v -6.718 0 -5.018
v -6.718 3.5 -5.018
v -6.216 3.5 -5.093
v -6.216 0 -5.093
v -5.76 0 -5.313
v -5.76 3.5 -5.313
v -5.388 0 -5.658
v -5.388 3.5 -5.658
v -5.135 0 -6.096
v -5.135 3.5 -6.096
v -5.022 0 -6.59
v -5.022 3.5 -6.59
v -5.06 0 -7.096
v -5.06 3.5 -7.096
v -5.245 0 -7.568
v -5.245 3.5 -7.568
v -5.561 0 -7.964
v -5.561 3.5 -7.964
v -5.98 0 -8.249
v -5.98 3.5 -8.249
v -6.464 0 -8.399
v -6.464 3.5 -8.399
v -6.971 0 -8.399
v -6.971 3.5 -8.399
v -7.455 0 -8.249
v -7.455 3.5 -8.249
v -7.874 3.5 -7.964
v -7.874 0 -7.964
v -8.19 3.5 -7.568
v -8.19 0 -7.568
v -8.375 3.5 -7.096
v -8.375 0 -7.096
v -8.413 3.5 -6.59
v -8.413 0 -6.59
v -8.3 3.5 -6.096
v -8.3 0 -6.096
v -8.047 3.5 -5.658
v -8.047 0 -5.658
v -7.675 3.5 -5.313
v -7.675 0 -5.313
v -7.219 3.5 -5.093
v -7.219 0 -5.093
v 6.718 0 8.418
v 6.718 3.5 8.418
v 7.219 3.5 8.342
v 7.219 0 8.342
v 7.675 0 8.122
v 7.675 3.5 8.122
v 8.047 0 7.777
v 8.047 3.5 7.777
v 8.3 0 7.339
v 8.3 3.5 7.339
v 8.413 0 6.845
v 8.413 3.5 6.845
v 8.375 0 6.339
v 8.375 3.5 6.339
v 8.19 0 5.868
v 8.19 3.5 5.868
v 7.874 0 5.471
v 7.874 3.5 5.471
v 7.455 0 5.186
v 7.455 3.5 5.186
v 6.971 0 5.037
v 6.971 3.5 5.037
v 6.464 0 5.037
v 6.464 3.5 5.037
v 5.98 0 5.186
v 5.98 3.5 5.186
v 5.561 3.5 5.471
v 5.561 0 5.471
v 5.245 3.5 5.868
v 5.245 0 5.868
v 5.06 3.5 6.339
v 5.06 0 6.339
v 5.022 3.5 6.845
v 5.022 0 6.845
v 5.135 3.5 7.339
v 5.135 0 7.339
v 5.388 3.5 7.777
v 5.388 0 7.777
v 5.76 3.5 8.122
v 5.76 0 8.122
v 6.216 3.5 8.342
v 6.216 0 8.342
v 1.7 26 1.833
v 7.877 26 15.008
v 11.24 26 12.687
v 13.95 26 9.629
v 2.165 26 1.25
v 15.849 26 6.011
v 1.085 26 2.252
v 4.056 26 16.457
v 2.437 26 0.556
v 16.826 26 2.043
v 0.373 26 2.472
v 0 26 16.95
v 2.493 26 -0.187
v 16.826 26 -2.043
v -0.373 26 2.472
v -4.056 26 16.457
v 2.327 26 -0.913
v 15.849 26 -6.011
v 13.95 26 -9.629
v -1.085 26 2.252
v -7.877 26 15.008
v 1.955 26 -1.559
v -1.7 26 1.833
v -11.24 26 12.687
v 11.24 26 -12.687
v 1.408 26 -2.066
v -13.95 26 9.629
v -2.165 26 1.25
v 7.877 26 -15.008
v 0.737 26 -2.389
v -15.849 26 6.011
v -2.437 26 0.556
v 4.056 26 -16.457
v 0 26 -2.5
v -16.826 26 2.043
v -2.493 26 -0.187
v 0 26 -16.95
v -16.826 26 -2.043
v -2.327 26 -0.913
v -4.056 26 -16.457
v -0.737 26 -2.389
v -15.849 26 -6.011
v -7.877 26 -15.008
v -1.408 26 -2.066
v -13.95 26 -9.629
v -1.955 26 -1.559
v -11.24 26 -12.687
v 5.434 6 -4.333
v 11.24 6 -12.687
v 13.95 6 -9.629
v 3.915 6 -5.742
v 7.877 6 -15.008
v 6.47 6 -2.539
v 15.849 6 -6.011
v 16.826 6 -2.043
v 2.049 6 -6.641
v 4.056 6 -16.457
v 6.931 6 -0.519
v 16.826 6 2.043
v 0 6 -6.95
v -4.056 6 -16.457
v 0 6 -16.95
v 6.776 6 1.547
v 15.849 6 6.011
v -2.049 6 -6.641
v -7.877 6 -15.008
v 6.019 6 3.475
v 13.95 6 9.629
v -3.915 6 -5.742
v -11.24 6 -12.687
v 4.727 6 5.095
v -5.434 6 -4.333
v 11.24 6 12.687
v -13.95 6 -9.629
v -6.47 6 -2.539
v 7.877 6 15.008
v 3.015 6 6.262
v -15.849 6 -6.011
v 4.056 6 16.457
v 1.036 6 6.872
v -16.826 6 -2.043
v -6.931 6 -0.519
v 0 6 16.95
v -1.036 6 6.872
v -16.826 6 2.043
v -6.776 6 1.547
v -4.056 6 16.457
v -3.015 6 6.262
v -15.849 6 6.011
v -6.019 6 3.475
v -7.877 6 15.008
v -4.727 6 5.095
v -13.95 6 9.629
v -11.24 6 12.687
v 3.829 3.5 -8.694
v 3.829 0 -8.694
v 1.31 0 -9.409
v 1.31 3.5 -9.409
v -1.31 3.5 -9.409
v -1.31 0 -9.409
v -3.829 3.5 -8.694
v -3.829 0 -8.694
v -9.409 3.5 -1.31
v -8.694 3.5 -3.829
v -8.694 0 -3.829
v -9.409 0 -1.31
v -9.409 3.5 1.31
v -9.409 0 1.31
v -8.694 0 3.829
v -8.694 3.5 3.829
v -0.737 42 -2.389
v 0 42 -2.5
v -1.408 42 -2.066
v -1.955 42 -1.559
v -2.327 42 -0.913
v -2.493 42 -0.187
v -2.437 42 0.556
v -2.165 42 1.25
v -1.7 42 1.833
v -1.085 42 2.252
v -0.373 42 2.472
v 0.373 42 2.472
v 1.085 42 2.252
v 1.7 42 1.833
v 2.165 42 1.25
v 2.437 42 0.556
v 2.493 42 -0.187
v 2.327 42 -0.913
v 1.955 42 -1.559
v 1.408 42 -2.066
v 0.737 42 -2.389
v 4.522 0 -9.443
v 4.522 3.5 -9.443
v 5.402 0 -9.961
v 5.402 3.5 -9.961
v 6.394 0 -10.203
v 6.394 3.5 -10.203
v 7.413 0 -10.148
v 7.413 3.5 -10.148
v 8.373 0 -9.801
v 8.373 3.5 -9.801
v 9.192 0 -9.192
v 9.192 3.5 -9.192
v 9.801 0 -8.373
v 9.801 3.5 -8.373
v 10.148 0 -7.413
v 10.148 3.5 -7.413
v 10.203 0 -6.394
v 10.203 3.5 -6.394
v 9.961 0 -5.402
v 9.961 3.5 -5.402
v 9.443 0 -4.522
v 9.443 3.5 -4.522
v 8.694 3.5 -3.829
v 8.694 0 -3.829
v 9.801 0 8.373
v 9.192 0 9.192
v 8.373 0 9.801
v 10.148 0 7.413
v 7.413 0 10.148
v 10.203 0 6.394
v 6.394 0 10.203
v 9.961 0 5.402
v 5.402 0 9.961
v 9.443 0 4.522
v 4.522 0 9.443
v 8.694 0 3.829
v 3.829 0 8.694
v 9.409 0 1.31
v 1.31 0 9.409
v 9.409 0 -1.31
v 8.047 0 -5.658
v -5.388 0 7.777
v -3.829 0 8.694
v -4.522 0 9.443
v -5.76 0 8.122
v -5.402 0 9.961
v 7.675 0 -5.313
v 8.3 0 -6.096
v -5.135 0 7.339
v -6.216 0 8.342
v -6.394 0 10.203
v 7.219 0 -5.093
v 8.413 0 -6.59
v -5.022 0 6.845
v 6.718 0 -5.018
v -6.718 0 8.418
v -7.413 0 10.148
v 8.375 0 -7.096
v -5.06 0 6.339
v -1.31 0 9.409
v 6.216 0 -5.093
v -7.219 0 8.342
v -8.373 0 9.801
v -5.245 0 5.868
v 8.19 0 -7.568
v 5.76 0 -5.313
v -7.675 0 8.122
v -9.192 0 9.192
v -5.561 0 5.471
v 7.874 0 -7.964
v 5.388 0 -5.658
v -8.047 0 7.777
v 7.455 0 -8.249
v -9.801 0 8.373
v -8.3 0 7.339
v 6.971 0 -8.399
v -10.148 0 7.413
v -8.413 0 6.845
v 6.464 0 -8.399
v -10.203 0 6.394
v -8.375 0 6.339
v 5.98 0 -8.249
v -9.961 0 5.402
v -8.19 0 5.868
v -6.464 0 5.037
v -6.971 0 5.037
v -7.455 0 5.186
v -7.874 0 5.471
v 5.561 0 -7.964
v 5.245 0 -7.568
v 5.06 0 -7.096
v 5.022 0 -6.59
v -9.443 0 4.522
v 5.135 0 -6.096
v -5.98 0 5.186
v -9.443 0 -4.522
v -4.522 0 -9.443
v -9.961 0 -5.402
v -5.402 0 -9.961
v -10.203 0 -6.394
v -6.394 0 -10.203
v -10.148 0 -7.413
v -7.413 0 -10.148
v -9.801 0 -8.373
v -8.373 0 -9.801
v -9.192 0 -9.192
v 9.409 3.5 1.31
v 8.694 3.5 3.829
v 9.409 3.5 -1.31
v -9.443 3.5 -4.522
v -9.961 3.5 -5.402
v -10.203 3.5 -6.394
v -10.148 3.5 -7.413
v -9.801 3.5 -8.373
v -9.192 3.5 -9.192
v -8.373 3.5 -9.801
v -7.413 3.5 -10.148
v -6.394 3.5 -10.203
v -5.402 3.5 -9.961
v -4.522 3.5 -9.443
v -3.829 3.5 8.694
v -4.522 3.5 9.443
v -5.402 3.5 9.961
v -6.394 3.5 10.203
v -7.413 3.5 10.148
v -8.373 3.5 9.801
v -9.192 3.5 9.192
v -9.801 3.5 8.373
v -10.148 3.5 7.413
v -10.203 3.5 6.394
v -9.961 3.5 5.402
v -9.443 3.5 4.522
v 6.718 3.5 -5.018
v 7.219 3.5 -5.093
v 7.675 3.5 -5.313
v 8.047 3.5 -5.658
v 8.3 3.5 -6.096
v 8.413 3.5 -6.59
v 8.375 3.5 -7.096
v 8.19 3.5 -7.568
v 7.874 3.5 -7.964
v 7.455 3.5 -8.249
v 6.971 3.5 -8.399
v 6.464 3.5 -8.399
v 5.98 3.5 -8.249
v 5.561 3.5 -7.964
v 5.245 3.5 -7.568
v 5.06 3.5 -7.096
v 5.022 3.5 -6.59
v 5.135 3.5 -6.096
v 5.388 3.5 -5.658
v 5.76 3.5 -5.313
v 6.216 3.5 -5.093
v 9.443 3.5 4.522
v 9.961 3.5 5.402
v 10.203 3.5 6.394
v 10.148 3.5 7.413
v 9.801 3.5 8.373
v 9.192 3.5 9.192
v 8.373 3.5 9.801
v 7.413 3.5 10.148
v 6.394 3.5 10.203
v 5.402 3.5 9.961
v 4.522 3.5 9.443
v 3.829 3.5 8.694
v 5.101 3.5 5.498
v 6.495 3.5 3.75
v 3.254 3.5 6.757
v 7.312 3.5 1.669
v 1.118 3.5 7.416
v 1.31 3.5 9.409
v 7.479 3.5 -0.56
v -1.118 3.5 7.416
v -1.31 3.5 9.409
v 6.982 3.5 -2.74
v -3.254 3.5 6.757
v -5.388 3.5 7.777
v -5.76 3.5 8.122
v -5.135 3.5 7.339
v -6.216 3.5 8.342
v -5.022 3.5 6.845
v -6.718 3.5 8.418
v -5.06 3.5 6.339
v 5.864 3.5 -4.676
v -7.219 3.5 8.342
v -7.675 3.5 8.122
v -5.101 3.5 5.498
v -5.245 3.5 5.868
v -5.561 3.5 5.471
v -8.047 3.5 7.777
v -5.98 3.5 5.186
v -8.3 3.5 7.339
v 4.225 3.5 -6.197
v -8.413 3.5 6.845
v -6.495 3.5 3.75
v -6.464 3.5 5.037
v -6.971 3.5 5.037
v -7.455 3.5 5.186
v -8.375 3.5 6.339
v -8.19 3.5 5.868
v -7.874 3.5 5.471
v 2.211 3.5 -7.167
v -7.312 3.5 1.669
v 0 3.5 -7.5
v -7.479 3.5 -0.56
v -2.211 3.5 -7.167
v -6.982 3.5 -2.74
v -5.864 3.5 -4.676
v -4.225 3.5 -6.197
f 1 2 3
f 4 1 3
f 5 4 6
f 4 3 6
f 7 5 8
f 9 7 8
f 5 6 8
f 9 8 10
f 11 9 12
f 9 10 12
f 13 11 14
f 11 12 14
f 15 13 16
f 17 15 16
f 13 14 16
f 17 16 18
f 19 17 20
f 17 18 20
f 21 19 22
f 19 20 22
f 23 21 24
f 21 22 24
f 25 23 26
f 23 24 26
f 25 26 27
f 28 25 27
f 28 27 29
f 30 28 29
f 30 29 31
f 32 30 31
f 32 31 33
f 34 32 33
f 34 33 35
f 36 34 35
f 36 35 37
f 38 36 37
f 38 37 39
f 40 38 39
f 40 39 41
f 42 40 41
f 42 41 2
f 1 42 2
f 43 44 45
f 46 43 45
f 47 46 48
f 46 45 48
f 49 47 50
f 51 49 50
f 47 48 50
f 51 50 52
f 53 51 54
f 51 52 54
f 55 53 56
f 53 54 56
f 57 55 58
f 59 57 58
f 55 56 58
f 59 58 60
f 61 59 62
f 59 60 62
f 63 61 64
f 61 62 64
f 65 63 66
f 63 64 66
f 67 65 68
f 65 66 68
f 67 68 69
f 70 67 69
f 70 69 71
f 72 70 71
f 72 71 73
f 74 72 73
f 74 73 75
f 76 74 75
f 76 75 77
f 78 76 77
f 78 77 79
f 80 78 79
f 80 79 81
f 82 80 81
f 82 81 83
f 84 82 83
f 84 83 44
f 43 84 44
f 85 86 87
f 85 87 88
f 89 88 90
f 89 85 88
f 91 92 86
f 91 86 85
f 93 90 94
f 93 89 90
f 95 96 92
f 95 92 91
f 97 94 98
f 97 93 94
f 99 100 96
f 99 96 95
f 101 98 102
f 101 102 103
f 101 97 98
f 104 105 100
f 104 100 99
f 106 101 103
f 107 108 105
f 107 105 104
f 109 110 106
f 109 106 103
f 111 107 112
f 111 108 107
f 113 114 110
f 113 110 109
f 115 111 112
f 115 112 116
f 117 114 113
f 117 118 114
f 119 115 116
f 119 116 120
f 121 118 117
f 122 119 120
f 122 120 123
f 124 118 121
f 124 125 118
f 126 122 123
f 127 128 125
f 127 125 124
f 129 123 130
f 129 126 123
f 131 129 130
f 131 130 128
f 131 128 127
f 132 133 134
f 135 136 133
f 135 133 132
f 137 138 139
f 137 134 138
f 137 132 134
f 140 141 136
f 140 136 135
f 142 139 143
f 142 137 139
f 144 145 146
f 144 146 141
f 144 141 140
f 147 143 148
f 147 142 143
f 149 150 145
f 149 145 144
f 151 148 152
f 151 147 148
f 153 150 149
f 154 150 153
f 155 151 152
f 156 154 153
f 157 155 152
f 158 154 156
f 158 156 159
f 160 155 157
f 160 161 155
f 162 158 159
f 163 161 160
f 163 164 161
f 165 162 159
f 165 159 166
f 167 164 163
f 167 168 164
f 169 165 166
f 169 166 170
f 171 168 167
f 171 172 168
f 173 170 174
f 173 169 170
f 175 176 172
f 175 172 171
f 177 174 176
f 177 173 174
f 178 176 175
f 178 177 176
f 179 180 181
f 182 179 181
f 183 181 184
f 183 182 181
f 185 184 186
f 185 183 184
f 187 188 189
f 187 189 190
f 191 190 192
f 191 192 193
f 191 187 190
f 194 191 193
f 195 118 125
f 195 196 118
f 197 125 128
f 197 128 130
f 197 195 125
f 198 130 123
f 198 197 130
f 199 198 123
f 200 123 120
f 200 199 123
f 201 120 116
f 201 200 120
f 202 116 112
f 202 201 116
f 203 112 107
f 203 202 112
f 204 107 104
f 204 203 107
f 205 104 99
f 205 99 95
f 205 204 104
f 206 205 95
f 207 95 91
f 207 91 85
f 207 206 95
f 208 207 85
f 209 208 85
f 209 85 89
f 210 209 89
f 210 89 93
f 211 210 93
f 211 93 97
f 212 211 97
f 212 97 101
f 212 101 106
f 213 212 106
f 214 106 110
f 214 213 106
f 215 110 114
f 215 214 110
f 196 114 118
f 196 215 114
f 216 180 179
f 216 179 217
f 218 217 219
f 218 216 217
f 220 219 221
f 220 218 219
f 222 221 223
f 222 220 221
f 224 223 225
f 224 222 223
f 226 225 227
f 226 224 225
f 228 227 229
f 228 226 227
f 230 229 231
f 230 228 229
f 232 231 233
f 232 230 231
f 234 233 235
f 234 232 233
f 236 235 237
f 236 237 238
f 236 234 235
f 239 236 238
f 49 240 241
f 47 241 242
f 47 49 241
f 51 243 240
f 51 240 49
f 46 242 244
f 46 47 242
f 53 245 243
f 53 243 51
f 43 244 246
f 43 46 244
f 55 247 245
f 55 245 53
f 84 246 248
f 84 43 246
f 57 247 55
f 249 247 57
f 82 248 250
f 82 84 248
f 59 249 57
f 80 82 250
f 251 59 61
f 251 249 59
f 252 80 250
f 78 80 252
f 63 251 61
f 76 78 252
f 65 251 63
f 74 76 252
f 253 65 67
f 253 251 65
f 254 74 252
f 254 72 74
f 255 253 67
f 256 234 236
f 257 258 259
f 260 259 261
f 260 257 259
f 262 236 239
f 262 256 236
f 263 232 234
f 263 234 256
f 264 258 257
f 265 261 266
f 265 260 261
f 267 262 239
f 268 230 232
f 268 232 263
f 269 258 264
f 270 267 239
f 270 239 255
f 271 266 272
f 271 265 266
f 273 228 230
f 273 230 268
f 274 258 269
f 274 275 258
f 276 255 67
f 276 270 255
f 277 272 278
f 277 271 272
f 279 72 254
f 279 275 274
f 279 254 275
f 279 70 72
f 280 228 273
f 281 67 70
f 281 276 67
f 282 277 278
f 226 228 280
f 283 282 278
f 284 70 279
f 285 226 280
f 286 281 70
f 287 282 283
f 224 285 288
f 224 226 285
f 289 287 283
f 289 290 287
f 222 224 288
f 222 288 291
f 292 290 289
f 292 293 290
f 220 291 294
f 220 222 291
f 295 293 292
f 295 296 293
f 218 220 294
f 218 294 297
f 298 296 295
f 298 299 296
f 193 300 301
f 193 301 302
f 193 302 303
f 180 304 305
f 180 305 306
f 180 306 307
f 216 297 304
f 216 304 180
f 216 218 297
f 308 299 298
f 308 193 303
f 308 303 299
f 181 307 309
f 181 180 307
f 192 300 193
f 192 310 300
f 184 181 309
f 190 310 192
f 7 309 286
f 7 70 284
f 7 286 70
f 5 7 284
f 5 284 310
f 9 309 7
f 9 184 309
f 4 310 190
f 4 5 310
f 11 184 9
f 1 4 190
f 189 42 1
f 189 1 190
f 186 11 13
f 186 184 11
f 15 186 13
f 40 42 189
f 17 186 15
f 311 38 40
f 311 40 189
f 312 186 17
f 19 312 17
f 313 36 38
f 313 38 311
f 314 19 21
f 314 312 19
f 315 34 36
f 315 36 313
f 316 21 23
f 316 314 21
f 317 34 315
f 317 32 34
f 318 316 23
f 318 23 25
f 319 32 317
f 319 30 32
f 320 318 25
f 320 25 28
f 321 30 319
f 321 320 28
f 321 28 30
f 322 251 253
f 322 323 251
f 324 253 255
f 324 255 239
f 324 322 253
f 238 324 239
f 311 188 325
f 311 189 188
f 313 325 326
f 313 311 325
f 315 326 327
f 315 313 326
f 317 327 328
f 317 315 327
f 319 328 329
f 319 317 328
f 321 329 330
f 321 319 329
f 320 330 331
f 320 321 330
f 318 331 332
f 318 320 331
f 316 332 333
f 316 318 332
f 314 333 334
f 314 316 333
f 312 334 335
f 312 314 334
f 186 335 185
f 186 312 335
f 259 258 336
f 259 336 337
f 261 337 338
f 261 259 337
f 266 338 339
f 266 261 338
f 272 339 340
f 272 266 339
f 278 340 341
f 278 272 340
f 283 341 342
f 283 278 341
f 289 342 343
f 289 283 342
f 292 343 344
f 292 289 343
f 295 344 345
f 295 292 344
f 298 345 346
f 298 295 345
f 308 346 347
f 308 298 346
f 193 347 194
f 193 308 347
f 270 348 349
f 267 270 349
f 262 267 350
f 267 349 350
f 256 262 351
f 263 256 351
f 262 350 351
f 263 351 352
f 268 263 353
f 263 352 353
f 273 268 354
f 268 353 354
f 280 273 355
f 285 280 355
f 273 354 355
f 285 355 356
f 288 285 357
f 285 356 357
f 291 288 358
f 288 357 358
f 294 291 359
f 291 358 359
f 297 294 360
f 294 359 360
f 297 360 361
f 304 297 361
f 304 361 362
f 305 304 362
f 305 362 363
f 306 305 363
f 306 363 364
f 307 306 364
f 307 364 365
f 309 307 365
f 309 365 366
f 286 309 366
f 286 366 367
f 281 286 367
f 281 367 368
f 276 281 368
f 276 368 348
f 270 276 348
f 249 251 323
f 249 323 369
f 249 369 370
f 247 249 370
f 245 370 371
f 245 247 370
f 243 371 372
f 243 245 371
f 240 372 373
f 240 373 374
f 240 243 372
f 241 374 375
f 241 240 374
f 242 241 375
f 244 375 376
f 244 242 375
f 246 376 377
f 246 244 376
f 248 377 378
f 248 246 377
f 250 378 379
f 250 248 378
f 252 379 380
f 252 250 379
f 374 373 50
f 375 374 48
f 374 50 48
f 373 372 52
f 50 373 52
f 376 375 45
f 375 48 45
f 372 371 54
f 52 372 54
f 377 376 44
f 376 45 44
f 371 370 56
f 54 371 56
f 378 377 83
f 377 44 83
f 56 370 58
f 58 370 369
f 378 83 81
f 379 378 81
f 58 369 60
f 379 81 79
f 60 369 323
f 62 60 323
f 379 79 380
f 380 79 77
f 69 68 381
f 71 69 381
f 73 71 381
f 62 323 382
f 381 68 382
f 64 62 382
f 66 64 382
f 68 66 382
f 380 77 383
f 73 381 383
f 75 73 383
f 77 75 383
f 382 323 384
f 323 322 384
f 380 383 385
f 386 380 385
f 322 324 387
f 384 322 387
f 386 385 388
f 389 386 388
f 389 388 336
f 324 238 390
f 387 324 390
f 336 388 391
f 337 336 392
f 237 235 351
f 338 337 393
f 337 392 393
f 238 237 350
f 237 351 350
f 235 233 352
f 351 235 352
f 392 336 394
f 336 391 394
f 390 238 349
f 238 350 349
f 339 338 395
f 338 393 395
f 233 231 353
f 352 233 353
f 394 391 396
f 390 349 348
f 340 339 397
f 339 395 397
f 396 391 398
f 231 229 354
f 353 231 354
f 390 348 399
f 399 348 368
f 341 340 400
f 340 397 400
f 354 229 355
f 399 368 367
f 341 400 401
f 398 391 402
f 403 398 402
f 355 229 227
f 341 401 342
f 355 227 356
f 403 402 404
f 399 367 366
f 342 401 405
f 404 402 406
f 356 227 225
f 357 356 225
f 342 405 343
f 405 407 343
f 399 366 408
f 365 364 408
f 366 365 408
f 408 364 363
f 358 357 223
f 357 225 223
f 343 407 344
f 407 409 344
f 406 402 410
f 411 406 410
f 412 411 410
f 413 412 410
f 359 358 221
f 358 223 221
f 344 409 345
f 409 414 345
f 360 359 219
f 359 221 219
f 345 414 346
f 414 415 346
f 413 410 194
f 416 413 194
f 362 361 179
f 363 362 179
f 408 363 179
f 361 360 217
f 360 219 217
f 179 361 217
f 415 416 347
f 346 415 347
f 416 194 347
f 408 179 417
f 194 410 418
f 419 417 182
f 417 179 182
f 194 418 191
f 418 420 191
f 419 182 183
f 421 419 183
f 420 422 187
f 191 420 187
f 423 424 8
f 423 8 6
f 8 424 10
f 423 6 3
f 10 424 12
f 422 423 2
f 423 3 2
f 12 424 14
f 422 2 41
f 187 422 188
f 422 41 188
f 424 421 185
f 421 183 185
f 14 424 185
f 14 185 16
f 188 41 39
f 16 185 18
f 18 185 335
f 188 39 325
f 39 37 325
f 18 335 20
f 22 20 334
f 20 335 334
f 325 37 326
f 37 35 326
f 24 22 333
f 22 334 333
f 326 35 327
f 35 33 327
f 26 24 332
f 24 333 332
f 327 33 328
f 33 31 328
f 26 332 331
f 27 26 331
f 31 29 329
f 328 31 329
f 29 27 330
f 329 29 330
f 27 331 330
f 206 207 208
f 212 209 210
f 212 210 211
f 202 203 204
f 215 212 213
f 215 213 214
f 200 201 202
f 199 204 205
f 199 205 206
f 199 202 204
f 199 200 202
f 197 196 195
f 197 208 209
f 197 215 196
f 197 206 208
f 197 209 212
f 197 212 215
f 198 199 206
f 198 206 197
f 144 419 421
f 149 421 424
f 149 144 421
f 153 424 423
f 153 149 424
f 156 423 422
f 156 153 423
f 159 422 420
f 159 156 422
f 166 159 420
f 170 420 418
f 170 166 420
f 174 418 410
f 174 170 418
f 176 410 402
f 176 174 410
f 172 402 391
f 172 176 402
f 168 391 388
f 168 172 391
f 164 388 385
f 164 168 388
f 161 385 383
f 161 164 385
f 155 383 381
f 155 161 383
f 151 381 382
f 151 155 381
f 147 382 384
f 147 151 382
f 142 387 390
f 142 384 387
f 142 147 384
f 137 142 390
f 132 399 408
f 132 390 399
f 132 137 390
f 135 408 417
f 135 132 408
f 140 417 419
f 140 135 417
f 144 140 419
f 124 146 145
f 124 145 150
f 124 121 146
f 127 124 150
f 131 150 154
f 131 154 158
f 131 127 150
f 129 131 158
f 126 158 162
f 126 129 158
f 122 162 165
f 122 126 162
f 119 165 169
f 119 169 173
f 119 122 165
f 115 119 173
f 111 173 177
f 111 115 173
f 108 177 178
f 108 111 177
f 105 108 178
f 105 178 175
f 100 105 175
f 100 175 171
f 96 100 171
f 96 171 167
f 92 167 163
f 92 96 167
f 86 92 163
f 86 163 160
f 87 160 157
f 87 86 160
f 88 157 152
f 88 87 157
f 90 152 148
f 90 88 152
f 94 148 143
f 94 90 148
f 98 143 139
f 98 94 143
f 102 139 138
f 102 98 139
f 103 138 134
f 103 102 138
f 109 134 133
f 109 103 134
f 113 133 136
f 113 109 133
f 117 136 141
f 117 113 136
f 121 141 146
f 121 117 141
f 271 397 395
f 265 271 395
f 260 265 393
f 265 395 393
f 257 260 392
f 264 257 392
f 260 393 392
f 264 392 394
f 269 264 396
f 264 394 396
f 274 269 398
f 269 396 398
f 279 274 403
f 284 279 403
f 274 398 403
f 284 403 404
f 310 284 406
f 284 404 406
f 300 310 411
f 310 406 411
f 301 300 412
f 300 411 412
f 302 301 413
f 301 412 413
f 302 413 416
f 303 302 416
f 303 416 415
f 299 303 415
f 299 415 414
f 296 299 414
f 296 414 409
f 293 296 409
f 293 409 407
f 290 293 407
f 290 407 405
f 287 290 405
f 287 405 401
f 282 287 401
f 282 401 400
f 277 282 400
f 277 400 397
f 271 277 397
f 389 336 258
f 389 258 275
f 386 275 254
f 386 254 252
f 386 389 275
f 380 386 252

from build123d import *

# Parameters (mm, degrees)
ESQUISSE2_R          = 3.5
BOSS_EXTRU_1_DEPTH   = 3.5
D_GAGEMENT_M31_D     = 3.4
D_GAGEMENT_M31_DEPTH = 3.5


with BuildPart() as part:
    # Esquisse1 → Révolution1 (revolve)
    with BuildSketch(Plane.XY, mode=Mode.PRIVATE) as r_volution1_sk:
        Polygon((0, 0), (-9.5, 0), (-9.5, 3.5), (-7.5, 3.5), (-6.95, 6), (-16.95, 6), (-16.95, 26), (-2.5, 26), (-2.5, 42), (0, 42), align=None)
    revolve(r_volution1_sk.sketch.rotate(Axis((0, 0, 0), (0, 1, 0)), 270), axis=Axis((0, 0, 0), (0, 1, 0)))

    # Esquisse2 → Boss.-Extru.1 (add)
    with BuildSketch(Plane(origin=(0, 0, 0), x_dir=(-1, 0, 0), z_dir=(0, -1, 0))):
        with Locations((6.717514421, -6.717514421)):
            Circle(ESQUISSE2_R)
        with Locations((-6.717514421, -6.717514421)):
            Circle(ESQUISSE2_R)
        with Locations((-6.717514421, 6.717514421)):
            Circle(ESQUISSE2_R)
        with Locations((6.717514421, 6.717514421)):
            Circle(ESQUISSE2_R)
    extrude(amount=-BOSS_EXTRU_1_DEPTH)

    # Dégagement M31
    with Locations(Plane(origin=(-6.717514421, 0, 6.717514421), x_dir=(0, 0, -1), z_dir=(0, -1, 0))):
        with Locations((0, 0), (0, 13.435028842), (13.435028842, 13.435028842), (13.435028842, 0)):
            Hole(D_GAGEMENT_M31_D / 2, depth=D_GAGEMENT_M31_DEPTH)


solid = part.part
